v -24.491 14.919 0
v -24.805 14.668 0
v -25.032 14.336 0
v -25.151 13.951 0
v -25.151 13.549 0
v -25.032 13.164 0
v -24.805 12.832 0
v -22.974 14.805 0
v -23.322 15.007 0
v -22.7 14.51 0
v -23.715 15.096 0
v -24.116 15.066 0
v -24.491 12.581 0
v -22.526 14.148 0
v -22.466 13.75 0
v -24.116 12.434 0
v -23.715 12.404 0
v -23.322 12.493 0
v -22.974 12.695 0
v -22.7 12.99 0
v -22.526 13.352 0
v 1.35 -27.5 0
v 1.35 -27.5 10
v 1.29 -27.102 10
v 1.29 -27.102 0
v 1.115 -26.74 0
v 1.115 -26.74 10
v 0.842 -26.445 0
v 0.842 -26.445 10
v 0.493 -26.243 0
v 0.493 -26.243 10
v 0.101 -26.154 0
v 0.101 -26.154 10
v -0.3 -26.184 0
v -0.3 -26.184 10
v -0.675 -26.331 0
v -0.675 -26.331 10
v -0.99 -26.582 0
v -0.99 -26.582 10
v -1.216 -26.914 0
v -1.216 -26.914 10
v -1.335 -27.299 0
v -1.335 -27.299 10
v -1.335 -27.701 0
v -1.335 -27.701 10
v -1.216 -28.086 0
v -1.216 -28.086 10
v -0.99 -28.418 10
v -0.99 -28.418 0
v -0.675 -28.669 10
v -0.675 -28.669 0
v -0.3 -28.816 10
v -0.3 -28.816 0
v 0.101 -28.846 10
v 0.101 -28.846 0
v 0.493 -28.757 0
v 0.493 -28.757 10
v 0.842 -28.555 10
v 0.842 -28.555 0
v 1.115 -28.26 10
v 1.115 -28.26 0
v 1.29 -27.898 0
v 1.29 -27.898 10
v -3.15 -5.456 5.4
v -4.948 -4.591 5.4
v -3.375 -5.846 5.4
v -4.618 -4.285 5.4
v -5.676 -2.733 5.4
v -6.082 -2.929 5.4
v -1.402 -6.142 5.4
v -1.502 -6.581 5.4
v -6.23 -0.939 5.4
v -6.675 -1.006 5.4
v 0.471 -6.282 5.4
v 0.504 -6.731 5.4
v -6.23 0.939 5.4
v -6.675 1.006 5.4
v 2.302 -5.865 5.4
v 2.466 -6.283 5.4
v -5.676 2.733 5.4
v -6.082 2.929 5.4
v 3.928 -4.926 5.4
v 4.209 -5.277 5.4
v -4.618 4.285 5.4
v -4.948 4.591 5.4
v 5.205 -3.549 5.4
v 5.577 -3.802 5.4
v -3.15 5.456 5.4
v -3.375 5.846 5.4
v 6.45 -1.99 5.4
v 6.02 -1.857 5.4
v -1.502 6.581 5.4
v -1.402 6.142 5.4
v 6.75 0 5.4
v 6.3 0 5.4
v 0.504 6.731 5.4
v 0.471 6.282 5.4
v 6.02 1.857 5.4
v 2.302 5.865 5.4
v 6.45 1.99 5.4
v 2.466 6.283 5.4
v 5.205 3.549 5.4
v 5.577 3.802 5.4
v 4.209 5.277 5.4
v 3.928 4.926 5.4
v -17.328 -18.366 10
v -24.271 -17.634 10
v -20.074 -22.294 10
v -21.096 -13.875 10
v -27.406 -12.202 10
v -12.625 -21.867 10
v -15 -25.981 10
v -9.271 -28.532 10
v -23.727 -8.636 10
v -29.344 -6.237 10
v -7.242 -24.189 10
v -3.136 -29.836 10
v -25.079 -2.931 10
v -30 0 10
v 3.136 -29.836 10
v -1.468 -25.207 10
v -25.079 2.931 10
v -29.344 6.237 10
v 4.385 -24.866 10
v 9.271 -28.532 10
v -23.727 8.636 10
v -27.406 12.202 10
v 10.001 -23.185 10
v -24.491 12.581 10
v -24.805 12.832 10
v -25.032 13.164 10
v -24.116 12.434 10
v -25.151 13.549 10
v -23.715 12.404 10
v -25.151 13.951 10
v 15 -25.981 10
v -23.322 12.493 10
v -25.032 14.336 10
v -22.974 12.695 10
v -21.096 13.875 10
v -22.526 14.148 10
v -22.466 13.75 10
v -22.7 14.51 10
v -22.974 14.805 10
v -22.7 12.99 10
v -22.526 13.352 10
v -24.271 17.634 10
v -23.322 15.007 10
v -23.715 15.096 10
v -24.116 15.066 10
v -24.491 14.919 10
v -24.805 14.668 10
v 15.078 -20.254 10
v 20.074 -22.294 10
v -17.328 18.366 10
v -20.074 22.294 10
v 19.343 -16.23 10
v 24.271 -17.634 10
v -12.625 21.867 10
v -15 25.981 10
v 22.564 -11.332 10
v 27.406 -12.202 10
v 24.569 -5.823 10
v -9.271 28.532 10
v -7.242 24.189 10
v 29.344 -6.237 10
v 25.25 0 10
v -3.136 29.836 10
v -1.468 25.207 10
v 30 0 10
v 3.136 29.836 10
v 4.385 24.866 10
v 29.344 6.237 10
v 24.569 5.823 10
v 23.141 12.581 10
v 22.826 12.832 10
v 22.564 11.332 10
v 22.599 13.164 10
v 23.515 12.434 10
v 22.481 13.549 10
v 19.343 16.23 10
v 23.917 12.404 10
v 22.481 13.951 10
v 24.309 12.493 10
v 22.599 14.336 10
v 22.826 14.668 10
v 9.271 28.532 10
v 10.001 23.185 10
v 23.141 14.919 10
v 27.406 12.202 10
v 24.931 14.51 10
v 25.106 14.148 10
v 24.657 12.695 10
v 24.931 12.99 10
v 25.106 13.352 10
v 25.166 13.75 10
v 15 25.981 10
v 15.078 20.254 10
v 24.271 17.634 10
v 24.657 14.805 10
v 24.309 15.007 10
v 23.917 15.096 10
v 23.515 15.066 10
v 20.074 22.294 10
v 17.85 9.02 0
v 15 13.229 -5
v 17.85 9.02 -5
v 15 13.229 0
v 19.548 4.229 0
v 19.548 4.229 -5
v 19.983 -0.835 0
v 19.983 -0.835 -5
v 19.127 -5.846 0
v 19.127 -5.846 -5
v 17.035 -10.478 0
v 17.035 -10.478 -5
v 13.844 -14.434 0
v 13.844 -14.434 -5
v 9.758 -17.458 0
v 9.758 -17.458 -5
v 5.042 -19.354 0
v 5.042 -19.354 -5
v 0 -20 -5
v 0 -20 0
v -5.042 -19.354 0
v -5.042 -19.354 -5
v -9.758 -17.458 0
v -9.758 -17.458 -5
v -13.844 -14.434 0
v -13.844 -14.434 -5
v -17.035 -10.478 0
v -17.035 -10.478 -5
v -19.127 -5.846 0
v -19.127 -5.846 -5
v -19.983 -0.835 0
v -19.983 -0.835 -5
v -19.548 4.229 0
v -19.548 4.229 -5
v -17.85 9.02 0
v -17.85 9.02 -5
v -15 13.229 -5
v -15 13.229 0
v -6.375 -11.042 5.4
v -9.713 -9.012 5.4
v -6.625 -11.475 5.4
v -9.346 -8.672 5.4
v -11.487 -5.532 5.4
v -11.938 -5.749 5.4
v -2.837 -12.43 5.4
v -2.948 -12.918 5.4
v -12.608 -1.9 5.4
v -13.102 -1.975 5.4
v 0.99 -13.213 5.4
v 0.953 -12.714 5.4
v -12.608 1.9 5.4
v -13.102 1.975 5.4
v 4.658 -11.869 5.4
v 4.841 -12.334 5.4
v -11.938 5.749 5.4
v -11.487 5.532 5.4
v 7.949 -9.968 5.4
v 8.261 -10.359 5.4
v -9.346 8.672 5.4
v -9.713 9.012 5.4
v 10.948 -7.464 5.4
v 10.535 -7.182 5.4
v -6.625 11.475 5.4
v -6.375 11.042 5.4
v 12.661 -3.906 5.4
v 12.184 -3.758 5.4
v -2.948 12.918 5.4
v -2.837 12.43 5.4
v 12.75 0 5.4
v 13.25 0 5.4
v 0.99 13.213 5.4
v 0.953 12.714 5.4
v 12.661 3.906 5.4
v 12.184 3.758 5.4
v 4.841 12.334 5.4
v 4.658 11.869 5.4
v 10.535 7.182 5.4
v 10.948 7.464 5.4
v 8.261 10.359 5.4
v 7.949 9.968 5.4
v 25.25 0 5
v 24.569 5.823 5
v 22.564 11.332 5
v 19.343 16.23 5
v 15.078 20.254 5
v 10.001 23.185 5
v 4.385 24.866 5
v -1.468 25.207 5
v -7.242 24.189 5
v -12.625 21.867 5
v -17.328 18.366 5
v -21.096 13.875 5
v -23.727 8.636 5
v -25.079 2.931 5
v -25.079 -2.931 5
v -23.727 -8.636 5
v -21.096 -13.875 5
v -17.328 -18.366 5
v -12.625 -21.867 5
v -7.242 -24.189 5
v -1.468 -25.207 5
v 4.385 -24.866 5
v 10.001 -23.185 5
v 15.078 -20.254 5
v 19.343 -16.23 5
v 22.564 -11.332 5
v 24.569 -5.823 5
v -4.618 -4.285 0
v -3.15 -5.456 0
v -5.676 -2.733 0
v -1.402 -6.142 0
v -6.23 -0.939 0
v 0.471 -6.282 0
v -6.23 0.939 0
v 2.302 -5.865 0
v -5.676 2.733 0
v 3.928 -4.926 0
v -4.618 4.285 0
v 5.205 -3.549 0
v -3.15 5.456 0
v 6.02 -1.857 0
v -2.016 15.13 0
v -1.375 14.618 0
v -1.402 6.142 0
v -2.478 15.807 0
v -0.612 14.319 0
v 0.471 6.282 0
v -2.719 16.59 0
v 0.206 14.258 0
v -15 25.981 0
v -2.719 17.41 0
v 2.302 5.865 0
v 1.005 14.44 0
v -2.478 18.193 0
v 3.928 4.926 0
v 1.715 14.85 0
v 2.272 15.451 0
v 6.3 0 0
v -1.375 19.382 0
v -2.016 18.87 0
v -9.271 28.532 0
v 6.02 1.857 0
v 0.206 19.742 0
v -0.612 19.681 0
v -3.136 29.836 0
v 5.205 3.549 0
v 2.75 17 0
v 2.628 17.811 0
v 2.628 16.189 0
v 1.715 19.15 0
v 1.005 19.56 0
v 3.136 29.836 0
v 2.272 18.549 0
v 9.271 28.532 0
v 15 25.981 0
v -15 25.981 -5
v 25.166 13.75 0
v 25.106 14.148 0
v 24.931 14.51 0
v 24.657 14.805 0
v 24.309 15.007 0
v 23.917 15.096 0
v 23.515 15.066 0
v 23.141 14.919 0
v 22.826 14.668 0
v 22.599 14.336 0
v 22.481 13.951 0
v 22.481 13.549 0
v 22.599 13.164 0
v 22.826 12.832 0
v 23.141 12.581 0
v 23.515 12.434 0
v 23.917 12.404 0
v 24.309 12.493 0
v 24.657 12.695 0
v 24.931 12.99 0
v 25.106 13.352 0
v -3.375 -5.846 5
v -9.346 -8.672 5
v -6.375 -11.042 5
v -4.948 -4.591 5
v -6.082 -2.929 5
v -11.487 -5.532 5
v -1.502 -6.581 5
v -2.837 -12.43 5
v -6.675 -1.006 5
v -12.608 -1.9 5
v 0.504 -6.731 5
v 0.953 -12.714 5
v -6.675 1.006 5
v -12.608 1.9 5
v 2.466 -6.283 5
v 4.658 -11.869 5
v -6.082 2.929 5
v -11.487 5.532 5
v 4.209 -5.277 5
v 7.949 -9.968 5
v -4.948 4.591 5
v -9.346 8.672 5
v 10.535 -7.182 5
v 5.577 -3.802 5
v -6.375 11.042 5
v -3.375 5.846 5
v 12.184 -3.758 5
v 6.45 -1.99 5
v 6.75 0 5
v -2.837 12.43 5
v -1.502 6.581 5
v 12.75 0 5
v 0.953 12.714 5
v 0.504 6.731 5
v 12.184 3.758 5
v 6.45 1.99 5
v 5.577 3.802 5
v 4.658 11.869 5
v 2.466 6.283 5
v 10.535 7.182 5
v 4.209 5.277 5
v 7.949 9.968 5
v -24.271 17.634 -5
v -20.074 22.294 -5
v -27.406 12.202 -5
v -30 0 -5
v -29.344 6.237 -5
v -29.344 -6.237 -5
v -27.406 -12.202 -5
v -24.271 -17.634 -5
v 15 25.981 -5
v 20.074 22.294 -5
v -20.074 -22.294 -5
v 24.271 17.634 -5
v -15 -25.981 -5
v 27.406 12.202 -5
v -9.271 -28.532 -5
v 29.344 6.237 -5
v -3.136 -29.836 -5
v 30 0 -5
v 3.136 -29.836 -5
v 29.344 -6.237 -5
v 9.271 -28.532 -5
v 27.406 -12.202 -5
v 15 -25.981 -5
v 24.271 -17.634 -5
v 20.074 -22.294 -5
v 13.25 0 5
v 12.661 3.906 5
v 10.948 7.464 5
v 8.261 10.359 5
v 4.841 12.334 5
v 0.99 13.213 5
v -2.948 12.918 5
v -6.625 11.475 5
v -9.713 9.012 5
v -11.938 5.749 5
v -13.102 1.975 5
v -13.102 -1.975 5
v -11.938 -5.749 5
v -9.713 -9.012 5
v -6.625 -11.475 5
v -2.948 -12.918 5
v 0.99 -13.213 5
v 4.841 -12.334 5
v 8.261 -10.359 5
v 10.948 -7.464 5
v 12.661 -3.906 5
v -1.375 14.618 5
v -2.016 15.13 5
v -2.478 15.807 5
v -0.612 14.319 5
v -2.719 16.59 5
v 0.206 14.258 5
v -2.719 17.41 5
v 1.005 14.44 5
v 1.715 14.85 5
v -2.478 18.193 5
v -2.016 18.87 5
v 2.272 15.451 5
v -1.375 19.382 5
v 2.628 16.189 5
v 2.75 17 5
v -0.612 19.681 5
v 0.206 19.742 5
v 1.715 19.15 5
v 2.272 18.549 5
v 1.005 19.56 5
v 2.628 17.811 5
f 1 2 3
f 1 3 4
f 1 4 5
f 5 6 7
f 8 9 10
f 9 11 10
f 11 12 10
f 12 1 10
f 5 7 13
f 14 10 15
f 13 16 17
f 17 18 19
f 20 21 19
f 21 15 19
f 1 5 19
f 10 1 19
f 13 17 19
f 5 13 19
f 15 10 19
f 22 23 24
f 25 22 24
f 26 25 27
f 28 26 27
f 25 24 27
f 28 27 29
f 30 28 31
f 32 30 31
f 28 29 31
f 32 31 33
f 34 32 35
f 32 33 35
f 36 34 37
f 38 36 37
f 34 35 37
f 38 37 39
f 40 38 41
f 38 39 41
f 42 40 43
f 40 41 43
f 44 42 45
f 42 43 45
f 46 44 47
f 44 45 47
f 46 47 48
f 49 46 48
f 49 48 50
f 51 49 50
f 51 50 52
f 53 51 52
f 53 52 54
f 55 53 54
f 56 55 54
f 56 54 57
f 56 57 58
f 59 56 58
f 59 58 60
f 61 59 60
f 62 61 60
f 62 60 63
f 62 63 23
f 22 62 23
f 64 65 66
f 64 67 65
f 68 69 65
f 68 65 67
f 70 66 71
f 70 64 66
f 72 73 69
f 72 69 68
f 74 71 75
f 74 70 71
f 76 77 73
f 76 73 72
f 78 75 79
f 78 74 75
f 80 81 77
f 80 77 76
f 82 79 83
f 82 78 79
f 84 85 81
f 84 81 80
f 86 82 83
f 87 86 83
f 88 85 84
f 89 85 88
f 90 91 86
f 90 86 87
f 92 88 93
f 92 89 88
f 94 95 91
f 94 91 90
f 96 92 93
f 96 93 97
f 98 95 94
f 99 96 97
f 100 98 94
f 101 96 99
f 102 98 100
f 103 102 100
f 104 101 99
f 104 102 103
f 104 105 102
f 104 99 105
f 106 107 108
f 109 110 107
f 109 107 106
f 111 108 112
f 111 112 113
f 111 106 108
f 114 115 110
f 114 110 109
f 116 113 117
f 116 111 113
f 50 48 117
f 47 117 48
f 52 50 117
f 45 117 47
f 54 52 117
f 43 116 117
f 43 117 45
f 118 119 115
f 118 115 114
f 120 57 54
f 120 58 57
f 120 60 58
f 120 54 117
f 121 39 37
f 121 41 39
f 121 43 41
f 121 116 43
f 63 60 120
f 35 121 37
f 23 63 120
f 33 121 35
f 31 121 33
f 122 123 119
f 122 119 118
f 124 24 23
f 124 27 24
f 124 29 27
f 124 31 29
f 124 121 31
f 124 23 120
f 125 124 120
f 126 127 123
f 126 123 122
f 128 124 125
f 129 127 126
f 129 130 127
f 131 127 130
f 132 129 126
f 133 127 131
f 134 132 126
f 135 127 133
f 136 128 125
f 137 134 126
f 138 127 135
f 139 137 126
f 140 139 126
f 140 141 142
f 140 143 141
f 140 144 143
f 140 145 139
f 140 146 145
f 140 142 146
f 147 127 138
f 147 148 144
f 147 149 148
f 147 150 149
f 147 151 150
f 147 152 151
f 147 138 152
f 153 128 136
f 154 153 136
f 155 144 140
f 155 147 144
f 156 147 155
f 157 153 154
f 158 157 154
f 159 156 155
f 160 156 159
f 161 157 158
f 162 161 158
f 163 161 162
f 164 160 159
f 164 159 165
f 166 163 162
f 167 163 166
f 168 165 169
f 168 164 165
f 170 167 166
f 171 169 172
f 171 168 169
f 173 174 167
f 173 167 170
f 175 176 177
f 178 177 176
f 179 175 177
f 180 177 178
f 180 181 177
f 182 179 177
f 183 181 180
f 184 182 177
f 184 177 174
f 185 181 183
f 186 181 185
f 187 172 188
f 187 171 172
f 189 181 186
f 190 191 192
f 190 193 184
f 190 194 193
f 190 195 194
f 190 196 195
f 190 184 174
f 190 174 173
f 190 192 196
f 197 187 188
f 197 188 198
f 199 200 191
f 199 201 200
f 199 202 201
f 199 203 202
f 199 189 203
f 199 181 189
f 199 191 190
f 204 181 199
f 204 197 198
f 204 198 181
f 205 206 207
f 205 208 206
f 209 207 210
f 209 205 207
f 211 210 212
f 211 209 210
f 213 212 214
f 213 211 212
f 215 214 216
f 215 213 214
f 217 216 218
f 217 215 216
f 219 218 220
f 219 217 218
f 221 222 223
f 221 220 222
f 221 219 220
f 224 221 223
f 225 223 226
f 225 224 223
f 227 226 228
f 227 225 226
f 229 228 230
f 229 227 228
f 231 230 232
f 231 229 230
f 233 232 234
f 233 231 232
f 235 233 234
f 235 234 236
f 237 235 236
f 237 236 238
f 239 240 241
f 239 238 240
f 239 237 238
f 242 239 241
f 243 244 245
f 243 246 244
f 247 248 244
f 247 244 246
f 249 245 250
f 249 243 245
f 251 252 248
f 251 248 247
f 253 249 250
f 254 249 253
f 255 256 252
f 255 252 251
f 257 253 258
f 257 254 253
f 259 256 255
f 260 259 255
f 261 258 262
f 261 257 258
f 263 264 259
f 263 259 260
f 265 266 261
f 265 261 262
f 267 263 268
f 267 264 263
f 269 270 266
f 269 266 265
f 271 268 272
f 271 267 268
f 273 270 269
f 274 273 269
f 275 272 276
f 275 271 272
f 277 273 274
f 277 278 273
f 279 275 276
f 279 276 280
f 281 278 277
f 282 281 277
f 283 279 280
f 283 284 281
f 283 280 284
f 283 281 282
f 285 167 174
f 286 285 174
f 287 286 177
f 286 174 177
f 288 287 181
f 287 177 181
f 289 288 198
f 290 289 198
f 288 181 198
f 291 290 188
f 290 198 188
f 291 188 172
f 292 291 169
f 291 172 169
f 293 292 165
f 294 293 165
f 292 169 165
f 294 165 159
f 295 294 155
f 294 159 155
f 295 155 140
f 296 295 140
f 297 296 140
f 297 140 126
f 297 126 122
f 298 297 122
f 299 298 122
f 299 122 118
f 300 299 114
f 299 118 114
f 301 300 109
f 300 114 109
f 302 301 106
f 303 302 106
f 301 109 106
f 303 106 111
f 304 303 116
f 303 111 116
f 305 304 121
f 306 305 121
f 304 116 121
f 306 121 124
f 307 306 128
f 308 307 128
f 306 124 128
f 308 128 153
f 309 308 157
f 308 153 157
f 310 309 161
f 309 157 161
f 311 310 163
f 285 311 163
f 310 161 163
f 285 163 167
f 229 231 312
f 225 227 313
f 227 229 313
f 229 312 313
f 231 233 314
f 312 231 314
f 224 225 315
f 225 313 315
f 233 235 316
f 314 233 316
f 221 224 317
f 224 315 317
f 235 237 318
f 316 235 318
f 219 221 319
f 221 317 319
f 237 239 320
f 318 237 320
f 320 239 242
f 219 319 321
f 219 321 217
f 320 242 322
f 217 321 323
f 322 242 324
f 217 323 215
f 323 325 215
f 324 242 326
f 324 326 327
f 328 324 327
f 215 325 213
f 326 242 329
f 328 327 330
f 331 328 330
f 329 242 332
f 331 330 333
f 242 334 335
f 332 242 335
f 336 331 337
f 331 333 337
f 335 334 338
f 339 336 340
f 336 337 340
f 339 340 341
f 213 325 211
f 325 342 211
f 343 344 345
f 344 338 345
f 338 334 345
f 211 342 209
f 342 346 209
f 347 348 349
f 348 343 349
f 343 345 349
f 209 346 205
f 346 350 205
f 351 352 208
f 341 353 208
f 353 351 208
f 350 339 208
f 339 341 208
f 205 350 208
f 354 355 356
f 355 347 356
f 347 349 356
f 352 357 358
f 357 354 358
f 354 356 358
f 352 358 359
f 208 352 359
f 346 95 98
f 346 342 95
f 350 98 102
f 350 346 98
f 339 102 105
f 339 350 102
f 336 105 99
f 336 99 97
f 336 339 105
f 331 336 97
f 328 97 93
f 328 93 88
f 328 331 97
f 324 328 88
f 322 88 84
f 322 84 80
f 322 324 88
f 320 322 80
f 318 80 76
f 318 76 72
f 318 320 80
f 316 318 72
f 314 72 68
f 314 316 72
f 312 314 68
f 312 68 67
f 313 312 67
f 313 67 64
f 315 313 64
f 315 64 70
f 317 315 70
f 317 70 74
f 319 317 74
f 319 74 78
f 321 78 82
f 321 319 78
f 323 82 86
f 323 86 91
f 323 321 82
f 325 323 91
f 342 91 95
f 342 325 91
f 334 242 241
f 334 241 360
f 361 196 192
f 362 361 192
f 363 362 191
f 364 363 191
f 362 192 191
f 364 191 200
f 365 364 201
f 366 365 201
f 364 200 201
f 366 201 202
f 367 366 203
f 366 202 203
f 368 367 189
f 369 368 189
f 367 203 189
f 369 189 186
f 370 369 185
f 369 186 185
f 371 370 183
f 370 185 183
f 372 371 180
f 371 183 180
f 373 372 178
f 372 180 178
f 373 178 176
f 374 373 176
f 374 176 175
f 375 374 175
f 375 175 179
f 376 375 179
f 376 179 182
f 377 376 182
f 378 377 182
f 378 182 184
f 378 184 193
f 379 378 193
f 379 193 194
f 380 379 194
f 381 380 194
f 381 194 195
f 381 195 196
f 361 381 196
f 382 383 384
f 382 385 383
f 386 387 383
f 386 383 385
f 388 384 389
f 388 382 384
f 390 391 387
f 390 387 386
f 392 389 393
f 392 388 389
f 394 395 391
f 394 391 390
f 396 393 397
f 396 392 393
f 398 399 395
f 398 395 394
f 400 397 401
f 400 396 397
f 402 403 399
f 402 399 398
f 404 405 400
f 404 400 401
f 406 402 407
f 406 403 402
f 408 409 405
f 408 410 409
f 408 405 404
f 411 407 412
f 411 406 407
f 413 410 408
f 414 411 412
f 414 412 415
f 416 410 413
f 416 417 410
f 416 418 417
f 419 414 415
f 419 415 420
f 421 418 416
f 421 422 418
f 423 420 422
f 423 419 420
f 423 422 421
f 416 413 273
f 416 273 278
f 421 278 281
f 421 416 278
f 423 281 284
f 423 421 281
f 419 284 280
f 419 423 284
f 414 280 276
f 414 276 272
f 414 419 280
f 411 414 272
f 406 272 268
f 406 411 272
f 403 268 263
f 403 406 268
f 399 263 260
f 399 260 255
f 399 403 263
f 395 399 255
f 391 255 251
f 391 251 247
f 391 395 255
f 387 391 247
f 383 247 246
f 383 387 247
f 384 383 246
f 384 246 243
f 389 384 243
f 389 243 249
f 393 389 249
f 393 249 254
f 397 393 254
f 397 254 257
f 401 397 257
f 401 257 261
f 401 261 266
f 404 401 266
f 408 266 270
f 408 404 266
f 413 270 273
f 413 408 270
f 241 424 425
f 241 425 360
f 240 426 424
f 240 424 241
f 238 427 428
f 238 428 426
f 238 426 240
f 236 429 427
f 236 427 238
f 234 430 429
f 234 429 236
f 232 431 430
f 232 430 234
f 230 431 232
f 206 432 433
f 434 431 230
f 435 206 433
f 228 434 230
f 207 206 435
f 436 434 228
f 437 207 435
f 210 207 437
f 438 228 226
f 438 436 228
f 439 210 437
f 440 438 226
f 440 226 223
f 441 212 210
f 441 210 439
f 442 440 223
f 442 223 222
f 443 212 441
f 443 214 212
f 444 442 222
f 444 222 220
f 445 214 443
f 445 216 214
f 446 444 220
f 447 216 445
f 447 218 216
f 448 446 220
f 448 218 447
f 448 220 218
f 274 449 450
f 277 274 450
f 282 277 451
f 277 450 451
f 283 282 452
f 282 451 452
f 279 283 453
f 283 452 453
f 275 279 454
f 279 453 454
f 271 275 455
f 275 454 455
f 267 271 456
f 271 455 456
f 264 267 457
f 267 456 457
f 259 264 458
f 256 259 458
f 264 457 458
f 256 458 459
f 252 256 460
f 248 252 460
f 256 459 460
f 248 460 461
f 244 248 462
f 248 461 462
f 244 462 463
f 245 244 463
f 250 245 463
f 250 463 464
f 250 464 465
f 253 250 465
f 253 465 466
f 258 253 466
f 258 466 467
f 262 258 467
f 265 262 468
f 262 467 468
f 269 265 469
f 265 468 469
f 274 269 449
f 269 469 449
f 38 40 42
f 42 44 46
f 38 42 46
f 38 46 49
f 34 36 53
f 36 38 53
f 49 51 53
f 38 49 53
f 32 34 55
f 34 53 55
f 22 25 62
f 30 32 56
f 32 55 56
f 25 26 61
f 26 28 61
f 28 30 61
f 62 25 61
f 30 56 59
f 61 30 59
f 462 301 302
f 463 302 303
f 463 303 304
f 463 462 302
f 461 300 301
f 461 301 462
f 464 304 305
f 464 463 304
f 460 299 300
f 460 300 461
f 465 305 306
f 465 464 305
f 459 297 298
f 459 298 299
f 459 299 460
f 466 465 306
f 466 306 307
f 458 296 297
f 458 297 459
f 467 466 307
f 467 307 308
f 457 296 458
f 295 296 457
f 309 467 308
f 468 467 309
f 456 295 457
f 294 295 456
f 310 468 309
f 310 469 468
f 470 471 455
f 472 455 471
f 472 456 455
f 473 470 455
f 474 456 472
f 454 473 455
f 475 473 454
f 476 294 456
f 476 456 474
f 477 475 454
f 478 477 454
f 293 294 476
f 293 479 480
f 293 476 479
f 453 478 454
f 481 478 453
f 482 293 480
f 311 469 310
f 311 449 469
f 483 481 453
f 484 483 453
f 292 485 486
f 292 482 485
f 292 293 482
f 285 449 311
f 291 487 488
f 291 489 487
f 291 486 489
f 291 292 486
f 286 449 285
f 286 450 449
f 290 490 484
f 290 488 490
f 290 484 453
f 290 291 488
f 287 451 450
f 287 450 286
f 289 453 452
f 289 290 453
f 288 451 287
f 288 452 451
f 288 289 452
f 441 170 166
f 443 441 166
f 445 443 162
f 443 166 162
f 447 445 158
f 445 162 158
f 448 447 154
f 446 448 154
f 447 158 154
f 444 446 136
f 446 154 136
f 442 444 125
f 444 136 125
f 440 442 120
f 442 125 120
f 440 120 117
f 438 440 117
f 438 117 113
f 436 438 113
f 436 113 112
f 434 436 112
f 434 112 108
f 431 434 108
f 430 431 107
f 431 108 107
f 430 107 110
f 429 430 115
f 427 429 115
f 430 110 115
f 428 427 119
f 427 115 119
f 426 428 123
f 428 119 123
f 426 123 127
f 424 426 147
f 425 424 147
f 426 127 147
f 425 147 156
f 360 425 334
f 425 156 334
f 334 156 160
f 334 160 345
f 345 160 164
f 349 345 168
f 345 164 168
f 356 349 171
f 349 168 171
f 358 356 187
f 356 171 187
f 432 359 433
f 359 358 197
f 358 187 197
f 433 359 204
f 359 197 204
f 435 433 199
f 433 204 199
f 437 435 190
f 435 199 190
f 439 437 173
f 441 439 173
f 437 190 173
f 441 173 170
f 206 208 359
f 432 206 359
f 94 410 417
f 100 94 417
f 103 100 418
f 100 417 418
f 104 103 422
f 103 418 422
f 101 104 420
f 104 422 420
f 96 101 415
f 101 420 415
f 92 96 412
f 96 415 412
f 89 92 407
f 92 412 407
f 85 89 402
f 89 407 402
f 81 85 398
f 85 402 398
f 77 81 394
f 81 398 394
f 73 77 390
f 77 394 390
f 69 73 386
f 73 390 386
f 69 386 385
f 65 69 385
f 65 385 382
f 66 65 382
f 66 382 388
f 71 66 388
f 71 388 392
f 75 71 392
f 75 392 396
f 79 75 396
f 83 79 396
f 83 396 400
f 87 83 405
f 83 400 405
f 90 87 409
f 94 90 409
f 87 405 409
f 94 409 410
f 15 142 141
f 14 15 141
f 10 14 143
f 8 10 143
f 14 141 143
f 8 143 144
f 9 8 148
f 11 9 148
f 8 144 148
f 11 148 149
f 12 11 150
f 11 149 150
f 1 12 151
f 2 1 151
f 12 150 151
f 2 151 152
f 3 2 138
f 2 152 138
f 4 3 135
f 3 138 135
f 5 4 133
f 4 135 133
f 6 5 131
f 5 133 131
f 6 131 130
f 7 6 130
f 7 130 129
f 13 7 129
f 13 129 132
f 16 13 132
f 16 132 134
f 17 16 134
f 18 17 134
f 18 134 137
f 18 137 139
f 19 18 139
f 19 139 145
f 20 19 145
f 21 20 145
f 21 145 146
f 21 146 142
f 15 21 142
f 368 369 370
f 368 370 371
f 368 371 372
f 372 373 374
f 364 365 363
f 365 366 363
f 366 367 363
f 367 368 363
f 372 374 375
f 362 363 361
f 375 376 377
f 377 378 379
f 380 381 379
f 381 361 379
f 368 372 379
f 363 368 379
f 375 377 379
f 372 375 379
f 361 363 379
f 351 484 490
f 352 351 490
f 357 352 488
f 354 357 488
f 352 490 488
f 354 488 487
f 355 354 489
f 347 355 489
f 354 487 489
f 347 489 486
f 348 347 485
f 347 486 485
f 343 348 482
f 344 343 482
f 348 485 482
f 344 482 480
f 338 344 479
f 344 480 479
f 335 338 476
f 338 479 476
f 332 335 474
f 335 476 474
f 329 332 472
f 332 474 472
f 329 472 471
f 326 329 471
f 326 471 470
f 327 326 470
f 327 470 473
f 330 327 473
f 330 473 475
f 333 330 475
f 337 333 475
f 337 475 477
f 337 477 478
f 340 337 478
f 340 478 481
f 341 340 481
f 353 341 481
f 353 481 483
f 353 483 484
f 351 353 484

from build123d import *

# Parameters (mm, degrees)
F0_R      = 30
F1_DEPTH  = 10
F2_R      = 25.25
F3_DEPTH  = 5
F4_R      = 6.3
F5_DEPTH  = 10.001
F6_R      = 1.35
F7_DEPTH  = 10.001
F8_R      = 2.75
F9_DEPTH  = 5.001
F10_R     = 30
F10_R_2   = 20
F11_DEPTH = 5
F12_W     = 30
F12_H     = 24.7647633499
F13_DEPTH = 5
F14_R     = 13.25
F14_R_2   = 12.75
F14_R_3   = 6.75
F14_R_4   = 6.3
F15_DEPTH = 0.4


with BuildPart() as f1:
    # F0 (on Top) → F1 (new body)
    with BuildSketch(Plane.XY):
        Circle(F0_R)
    extrude(amount=F1_DEPTH)

    # F2 (on face) → F3 (cut)
    with BuildSketch(Plane.XY.offset(10)):
        Circle(F2_R)
    extrude(amount=-F3_DEPTH, mode=Mode.SUBTRACT)

    # F4 (on Top) → F5 (cut, through all)
    with BuildSketch(Plane.XY):
        Circle(F4_R)
    extrude(amount=F5_DEPTH, mode=Mode.SUBTRACT)

    # F6 (on face) → F7 (cut, through all)
    with BuildSketch(Plane.XY.offset(10)):
        with Locations((23.8156986041, 13.75)):
            Circle(F6_R)
        with Locations((0, -27.5)):
            Circle(F6_R)
        with Locations((-23.8156986041, 13.75)):
            Circle(F6_R)
    extrude(amount=-F7_DEPTH, mode=Mode.SUBTRACT)

    # F8 (on face) → F9 (cut, through all)
    with BuildSketch(Plane.XY.offset(5)):
        with Locations((0, 17)):
            Circle(F8_R)
    extrude(amount=-F9_DEPTH, mode=Mode.SUBTRACT)

    # F10 (on face) → F11 (join)
    with BuildSketch(Plane(origin=(0, 0, 0), x_dir=(1, 0, 0), z_dir=(0, 0, -1))):
        Circle(F10_R)
        Circle(F10_R_2, mode=Mode.SUBTRACT)
    extrude(amount=F11_DEPTH)

    # F12 (on Top) → F13 (cut)
    with BuildSketch(Plane.XY):
        with Locations((0, 20.9111002412)):
            Rectangle(F12_W, F12_H)
    extrude(amount=-F13_DEPTH, mode=Mode.SUBTRACT)

    # F14 (on face) → F15 (join)
    with BuildSketch(Plane.XY.offset(5)):
        Circle(F14_R)
        Circle(F14_R_2, mode=Mode.SUBTRACT)
        Circle(F14_R_3)
        Circle(F14_R_4, mode=Mode.SUBTRACT)
    extrude(amount=F15_DEPTH)


solid = f1.part
